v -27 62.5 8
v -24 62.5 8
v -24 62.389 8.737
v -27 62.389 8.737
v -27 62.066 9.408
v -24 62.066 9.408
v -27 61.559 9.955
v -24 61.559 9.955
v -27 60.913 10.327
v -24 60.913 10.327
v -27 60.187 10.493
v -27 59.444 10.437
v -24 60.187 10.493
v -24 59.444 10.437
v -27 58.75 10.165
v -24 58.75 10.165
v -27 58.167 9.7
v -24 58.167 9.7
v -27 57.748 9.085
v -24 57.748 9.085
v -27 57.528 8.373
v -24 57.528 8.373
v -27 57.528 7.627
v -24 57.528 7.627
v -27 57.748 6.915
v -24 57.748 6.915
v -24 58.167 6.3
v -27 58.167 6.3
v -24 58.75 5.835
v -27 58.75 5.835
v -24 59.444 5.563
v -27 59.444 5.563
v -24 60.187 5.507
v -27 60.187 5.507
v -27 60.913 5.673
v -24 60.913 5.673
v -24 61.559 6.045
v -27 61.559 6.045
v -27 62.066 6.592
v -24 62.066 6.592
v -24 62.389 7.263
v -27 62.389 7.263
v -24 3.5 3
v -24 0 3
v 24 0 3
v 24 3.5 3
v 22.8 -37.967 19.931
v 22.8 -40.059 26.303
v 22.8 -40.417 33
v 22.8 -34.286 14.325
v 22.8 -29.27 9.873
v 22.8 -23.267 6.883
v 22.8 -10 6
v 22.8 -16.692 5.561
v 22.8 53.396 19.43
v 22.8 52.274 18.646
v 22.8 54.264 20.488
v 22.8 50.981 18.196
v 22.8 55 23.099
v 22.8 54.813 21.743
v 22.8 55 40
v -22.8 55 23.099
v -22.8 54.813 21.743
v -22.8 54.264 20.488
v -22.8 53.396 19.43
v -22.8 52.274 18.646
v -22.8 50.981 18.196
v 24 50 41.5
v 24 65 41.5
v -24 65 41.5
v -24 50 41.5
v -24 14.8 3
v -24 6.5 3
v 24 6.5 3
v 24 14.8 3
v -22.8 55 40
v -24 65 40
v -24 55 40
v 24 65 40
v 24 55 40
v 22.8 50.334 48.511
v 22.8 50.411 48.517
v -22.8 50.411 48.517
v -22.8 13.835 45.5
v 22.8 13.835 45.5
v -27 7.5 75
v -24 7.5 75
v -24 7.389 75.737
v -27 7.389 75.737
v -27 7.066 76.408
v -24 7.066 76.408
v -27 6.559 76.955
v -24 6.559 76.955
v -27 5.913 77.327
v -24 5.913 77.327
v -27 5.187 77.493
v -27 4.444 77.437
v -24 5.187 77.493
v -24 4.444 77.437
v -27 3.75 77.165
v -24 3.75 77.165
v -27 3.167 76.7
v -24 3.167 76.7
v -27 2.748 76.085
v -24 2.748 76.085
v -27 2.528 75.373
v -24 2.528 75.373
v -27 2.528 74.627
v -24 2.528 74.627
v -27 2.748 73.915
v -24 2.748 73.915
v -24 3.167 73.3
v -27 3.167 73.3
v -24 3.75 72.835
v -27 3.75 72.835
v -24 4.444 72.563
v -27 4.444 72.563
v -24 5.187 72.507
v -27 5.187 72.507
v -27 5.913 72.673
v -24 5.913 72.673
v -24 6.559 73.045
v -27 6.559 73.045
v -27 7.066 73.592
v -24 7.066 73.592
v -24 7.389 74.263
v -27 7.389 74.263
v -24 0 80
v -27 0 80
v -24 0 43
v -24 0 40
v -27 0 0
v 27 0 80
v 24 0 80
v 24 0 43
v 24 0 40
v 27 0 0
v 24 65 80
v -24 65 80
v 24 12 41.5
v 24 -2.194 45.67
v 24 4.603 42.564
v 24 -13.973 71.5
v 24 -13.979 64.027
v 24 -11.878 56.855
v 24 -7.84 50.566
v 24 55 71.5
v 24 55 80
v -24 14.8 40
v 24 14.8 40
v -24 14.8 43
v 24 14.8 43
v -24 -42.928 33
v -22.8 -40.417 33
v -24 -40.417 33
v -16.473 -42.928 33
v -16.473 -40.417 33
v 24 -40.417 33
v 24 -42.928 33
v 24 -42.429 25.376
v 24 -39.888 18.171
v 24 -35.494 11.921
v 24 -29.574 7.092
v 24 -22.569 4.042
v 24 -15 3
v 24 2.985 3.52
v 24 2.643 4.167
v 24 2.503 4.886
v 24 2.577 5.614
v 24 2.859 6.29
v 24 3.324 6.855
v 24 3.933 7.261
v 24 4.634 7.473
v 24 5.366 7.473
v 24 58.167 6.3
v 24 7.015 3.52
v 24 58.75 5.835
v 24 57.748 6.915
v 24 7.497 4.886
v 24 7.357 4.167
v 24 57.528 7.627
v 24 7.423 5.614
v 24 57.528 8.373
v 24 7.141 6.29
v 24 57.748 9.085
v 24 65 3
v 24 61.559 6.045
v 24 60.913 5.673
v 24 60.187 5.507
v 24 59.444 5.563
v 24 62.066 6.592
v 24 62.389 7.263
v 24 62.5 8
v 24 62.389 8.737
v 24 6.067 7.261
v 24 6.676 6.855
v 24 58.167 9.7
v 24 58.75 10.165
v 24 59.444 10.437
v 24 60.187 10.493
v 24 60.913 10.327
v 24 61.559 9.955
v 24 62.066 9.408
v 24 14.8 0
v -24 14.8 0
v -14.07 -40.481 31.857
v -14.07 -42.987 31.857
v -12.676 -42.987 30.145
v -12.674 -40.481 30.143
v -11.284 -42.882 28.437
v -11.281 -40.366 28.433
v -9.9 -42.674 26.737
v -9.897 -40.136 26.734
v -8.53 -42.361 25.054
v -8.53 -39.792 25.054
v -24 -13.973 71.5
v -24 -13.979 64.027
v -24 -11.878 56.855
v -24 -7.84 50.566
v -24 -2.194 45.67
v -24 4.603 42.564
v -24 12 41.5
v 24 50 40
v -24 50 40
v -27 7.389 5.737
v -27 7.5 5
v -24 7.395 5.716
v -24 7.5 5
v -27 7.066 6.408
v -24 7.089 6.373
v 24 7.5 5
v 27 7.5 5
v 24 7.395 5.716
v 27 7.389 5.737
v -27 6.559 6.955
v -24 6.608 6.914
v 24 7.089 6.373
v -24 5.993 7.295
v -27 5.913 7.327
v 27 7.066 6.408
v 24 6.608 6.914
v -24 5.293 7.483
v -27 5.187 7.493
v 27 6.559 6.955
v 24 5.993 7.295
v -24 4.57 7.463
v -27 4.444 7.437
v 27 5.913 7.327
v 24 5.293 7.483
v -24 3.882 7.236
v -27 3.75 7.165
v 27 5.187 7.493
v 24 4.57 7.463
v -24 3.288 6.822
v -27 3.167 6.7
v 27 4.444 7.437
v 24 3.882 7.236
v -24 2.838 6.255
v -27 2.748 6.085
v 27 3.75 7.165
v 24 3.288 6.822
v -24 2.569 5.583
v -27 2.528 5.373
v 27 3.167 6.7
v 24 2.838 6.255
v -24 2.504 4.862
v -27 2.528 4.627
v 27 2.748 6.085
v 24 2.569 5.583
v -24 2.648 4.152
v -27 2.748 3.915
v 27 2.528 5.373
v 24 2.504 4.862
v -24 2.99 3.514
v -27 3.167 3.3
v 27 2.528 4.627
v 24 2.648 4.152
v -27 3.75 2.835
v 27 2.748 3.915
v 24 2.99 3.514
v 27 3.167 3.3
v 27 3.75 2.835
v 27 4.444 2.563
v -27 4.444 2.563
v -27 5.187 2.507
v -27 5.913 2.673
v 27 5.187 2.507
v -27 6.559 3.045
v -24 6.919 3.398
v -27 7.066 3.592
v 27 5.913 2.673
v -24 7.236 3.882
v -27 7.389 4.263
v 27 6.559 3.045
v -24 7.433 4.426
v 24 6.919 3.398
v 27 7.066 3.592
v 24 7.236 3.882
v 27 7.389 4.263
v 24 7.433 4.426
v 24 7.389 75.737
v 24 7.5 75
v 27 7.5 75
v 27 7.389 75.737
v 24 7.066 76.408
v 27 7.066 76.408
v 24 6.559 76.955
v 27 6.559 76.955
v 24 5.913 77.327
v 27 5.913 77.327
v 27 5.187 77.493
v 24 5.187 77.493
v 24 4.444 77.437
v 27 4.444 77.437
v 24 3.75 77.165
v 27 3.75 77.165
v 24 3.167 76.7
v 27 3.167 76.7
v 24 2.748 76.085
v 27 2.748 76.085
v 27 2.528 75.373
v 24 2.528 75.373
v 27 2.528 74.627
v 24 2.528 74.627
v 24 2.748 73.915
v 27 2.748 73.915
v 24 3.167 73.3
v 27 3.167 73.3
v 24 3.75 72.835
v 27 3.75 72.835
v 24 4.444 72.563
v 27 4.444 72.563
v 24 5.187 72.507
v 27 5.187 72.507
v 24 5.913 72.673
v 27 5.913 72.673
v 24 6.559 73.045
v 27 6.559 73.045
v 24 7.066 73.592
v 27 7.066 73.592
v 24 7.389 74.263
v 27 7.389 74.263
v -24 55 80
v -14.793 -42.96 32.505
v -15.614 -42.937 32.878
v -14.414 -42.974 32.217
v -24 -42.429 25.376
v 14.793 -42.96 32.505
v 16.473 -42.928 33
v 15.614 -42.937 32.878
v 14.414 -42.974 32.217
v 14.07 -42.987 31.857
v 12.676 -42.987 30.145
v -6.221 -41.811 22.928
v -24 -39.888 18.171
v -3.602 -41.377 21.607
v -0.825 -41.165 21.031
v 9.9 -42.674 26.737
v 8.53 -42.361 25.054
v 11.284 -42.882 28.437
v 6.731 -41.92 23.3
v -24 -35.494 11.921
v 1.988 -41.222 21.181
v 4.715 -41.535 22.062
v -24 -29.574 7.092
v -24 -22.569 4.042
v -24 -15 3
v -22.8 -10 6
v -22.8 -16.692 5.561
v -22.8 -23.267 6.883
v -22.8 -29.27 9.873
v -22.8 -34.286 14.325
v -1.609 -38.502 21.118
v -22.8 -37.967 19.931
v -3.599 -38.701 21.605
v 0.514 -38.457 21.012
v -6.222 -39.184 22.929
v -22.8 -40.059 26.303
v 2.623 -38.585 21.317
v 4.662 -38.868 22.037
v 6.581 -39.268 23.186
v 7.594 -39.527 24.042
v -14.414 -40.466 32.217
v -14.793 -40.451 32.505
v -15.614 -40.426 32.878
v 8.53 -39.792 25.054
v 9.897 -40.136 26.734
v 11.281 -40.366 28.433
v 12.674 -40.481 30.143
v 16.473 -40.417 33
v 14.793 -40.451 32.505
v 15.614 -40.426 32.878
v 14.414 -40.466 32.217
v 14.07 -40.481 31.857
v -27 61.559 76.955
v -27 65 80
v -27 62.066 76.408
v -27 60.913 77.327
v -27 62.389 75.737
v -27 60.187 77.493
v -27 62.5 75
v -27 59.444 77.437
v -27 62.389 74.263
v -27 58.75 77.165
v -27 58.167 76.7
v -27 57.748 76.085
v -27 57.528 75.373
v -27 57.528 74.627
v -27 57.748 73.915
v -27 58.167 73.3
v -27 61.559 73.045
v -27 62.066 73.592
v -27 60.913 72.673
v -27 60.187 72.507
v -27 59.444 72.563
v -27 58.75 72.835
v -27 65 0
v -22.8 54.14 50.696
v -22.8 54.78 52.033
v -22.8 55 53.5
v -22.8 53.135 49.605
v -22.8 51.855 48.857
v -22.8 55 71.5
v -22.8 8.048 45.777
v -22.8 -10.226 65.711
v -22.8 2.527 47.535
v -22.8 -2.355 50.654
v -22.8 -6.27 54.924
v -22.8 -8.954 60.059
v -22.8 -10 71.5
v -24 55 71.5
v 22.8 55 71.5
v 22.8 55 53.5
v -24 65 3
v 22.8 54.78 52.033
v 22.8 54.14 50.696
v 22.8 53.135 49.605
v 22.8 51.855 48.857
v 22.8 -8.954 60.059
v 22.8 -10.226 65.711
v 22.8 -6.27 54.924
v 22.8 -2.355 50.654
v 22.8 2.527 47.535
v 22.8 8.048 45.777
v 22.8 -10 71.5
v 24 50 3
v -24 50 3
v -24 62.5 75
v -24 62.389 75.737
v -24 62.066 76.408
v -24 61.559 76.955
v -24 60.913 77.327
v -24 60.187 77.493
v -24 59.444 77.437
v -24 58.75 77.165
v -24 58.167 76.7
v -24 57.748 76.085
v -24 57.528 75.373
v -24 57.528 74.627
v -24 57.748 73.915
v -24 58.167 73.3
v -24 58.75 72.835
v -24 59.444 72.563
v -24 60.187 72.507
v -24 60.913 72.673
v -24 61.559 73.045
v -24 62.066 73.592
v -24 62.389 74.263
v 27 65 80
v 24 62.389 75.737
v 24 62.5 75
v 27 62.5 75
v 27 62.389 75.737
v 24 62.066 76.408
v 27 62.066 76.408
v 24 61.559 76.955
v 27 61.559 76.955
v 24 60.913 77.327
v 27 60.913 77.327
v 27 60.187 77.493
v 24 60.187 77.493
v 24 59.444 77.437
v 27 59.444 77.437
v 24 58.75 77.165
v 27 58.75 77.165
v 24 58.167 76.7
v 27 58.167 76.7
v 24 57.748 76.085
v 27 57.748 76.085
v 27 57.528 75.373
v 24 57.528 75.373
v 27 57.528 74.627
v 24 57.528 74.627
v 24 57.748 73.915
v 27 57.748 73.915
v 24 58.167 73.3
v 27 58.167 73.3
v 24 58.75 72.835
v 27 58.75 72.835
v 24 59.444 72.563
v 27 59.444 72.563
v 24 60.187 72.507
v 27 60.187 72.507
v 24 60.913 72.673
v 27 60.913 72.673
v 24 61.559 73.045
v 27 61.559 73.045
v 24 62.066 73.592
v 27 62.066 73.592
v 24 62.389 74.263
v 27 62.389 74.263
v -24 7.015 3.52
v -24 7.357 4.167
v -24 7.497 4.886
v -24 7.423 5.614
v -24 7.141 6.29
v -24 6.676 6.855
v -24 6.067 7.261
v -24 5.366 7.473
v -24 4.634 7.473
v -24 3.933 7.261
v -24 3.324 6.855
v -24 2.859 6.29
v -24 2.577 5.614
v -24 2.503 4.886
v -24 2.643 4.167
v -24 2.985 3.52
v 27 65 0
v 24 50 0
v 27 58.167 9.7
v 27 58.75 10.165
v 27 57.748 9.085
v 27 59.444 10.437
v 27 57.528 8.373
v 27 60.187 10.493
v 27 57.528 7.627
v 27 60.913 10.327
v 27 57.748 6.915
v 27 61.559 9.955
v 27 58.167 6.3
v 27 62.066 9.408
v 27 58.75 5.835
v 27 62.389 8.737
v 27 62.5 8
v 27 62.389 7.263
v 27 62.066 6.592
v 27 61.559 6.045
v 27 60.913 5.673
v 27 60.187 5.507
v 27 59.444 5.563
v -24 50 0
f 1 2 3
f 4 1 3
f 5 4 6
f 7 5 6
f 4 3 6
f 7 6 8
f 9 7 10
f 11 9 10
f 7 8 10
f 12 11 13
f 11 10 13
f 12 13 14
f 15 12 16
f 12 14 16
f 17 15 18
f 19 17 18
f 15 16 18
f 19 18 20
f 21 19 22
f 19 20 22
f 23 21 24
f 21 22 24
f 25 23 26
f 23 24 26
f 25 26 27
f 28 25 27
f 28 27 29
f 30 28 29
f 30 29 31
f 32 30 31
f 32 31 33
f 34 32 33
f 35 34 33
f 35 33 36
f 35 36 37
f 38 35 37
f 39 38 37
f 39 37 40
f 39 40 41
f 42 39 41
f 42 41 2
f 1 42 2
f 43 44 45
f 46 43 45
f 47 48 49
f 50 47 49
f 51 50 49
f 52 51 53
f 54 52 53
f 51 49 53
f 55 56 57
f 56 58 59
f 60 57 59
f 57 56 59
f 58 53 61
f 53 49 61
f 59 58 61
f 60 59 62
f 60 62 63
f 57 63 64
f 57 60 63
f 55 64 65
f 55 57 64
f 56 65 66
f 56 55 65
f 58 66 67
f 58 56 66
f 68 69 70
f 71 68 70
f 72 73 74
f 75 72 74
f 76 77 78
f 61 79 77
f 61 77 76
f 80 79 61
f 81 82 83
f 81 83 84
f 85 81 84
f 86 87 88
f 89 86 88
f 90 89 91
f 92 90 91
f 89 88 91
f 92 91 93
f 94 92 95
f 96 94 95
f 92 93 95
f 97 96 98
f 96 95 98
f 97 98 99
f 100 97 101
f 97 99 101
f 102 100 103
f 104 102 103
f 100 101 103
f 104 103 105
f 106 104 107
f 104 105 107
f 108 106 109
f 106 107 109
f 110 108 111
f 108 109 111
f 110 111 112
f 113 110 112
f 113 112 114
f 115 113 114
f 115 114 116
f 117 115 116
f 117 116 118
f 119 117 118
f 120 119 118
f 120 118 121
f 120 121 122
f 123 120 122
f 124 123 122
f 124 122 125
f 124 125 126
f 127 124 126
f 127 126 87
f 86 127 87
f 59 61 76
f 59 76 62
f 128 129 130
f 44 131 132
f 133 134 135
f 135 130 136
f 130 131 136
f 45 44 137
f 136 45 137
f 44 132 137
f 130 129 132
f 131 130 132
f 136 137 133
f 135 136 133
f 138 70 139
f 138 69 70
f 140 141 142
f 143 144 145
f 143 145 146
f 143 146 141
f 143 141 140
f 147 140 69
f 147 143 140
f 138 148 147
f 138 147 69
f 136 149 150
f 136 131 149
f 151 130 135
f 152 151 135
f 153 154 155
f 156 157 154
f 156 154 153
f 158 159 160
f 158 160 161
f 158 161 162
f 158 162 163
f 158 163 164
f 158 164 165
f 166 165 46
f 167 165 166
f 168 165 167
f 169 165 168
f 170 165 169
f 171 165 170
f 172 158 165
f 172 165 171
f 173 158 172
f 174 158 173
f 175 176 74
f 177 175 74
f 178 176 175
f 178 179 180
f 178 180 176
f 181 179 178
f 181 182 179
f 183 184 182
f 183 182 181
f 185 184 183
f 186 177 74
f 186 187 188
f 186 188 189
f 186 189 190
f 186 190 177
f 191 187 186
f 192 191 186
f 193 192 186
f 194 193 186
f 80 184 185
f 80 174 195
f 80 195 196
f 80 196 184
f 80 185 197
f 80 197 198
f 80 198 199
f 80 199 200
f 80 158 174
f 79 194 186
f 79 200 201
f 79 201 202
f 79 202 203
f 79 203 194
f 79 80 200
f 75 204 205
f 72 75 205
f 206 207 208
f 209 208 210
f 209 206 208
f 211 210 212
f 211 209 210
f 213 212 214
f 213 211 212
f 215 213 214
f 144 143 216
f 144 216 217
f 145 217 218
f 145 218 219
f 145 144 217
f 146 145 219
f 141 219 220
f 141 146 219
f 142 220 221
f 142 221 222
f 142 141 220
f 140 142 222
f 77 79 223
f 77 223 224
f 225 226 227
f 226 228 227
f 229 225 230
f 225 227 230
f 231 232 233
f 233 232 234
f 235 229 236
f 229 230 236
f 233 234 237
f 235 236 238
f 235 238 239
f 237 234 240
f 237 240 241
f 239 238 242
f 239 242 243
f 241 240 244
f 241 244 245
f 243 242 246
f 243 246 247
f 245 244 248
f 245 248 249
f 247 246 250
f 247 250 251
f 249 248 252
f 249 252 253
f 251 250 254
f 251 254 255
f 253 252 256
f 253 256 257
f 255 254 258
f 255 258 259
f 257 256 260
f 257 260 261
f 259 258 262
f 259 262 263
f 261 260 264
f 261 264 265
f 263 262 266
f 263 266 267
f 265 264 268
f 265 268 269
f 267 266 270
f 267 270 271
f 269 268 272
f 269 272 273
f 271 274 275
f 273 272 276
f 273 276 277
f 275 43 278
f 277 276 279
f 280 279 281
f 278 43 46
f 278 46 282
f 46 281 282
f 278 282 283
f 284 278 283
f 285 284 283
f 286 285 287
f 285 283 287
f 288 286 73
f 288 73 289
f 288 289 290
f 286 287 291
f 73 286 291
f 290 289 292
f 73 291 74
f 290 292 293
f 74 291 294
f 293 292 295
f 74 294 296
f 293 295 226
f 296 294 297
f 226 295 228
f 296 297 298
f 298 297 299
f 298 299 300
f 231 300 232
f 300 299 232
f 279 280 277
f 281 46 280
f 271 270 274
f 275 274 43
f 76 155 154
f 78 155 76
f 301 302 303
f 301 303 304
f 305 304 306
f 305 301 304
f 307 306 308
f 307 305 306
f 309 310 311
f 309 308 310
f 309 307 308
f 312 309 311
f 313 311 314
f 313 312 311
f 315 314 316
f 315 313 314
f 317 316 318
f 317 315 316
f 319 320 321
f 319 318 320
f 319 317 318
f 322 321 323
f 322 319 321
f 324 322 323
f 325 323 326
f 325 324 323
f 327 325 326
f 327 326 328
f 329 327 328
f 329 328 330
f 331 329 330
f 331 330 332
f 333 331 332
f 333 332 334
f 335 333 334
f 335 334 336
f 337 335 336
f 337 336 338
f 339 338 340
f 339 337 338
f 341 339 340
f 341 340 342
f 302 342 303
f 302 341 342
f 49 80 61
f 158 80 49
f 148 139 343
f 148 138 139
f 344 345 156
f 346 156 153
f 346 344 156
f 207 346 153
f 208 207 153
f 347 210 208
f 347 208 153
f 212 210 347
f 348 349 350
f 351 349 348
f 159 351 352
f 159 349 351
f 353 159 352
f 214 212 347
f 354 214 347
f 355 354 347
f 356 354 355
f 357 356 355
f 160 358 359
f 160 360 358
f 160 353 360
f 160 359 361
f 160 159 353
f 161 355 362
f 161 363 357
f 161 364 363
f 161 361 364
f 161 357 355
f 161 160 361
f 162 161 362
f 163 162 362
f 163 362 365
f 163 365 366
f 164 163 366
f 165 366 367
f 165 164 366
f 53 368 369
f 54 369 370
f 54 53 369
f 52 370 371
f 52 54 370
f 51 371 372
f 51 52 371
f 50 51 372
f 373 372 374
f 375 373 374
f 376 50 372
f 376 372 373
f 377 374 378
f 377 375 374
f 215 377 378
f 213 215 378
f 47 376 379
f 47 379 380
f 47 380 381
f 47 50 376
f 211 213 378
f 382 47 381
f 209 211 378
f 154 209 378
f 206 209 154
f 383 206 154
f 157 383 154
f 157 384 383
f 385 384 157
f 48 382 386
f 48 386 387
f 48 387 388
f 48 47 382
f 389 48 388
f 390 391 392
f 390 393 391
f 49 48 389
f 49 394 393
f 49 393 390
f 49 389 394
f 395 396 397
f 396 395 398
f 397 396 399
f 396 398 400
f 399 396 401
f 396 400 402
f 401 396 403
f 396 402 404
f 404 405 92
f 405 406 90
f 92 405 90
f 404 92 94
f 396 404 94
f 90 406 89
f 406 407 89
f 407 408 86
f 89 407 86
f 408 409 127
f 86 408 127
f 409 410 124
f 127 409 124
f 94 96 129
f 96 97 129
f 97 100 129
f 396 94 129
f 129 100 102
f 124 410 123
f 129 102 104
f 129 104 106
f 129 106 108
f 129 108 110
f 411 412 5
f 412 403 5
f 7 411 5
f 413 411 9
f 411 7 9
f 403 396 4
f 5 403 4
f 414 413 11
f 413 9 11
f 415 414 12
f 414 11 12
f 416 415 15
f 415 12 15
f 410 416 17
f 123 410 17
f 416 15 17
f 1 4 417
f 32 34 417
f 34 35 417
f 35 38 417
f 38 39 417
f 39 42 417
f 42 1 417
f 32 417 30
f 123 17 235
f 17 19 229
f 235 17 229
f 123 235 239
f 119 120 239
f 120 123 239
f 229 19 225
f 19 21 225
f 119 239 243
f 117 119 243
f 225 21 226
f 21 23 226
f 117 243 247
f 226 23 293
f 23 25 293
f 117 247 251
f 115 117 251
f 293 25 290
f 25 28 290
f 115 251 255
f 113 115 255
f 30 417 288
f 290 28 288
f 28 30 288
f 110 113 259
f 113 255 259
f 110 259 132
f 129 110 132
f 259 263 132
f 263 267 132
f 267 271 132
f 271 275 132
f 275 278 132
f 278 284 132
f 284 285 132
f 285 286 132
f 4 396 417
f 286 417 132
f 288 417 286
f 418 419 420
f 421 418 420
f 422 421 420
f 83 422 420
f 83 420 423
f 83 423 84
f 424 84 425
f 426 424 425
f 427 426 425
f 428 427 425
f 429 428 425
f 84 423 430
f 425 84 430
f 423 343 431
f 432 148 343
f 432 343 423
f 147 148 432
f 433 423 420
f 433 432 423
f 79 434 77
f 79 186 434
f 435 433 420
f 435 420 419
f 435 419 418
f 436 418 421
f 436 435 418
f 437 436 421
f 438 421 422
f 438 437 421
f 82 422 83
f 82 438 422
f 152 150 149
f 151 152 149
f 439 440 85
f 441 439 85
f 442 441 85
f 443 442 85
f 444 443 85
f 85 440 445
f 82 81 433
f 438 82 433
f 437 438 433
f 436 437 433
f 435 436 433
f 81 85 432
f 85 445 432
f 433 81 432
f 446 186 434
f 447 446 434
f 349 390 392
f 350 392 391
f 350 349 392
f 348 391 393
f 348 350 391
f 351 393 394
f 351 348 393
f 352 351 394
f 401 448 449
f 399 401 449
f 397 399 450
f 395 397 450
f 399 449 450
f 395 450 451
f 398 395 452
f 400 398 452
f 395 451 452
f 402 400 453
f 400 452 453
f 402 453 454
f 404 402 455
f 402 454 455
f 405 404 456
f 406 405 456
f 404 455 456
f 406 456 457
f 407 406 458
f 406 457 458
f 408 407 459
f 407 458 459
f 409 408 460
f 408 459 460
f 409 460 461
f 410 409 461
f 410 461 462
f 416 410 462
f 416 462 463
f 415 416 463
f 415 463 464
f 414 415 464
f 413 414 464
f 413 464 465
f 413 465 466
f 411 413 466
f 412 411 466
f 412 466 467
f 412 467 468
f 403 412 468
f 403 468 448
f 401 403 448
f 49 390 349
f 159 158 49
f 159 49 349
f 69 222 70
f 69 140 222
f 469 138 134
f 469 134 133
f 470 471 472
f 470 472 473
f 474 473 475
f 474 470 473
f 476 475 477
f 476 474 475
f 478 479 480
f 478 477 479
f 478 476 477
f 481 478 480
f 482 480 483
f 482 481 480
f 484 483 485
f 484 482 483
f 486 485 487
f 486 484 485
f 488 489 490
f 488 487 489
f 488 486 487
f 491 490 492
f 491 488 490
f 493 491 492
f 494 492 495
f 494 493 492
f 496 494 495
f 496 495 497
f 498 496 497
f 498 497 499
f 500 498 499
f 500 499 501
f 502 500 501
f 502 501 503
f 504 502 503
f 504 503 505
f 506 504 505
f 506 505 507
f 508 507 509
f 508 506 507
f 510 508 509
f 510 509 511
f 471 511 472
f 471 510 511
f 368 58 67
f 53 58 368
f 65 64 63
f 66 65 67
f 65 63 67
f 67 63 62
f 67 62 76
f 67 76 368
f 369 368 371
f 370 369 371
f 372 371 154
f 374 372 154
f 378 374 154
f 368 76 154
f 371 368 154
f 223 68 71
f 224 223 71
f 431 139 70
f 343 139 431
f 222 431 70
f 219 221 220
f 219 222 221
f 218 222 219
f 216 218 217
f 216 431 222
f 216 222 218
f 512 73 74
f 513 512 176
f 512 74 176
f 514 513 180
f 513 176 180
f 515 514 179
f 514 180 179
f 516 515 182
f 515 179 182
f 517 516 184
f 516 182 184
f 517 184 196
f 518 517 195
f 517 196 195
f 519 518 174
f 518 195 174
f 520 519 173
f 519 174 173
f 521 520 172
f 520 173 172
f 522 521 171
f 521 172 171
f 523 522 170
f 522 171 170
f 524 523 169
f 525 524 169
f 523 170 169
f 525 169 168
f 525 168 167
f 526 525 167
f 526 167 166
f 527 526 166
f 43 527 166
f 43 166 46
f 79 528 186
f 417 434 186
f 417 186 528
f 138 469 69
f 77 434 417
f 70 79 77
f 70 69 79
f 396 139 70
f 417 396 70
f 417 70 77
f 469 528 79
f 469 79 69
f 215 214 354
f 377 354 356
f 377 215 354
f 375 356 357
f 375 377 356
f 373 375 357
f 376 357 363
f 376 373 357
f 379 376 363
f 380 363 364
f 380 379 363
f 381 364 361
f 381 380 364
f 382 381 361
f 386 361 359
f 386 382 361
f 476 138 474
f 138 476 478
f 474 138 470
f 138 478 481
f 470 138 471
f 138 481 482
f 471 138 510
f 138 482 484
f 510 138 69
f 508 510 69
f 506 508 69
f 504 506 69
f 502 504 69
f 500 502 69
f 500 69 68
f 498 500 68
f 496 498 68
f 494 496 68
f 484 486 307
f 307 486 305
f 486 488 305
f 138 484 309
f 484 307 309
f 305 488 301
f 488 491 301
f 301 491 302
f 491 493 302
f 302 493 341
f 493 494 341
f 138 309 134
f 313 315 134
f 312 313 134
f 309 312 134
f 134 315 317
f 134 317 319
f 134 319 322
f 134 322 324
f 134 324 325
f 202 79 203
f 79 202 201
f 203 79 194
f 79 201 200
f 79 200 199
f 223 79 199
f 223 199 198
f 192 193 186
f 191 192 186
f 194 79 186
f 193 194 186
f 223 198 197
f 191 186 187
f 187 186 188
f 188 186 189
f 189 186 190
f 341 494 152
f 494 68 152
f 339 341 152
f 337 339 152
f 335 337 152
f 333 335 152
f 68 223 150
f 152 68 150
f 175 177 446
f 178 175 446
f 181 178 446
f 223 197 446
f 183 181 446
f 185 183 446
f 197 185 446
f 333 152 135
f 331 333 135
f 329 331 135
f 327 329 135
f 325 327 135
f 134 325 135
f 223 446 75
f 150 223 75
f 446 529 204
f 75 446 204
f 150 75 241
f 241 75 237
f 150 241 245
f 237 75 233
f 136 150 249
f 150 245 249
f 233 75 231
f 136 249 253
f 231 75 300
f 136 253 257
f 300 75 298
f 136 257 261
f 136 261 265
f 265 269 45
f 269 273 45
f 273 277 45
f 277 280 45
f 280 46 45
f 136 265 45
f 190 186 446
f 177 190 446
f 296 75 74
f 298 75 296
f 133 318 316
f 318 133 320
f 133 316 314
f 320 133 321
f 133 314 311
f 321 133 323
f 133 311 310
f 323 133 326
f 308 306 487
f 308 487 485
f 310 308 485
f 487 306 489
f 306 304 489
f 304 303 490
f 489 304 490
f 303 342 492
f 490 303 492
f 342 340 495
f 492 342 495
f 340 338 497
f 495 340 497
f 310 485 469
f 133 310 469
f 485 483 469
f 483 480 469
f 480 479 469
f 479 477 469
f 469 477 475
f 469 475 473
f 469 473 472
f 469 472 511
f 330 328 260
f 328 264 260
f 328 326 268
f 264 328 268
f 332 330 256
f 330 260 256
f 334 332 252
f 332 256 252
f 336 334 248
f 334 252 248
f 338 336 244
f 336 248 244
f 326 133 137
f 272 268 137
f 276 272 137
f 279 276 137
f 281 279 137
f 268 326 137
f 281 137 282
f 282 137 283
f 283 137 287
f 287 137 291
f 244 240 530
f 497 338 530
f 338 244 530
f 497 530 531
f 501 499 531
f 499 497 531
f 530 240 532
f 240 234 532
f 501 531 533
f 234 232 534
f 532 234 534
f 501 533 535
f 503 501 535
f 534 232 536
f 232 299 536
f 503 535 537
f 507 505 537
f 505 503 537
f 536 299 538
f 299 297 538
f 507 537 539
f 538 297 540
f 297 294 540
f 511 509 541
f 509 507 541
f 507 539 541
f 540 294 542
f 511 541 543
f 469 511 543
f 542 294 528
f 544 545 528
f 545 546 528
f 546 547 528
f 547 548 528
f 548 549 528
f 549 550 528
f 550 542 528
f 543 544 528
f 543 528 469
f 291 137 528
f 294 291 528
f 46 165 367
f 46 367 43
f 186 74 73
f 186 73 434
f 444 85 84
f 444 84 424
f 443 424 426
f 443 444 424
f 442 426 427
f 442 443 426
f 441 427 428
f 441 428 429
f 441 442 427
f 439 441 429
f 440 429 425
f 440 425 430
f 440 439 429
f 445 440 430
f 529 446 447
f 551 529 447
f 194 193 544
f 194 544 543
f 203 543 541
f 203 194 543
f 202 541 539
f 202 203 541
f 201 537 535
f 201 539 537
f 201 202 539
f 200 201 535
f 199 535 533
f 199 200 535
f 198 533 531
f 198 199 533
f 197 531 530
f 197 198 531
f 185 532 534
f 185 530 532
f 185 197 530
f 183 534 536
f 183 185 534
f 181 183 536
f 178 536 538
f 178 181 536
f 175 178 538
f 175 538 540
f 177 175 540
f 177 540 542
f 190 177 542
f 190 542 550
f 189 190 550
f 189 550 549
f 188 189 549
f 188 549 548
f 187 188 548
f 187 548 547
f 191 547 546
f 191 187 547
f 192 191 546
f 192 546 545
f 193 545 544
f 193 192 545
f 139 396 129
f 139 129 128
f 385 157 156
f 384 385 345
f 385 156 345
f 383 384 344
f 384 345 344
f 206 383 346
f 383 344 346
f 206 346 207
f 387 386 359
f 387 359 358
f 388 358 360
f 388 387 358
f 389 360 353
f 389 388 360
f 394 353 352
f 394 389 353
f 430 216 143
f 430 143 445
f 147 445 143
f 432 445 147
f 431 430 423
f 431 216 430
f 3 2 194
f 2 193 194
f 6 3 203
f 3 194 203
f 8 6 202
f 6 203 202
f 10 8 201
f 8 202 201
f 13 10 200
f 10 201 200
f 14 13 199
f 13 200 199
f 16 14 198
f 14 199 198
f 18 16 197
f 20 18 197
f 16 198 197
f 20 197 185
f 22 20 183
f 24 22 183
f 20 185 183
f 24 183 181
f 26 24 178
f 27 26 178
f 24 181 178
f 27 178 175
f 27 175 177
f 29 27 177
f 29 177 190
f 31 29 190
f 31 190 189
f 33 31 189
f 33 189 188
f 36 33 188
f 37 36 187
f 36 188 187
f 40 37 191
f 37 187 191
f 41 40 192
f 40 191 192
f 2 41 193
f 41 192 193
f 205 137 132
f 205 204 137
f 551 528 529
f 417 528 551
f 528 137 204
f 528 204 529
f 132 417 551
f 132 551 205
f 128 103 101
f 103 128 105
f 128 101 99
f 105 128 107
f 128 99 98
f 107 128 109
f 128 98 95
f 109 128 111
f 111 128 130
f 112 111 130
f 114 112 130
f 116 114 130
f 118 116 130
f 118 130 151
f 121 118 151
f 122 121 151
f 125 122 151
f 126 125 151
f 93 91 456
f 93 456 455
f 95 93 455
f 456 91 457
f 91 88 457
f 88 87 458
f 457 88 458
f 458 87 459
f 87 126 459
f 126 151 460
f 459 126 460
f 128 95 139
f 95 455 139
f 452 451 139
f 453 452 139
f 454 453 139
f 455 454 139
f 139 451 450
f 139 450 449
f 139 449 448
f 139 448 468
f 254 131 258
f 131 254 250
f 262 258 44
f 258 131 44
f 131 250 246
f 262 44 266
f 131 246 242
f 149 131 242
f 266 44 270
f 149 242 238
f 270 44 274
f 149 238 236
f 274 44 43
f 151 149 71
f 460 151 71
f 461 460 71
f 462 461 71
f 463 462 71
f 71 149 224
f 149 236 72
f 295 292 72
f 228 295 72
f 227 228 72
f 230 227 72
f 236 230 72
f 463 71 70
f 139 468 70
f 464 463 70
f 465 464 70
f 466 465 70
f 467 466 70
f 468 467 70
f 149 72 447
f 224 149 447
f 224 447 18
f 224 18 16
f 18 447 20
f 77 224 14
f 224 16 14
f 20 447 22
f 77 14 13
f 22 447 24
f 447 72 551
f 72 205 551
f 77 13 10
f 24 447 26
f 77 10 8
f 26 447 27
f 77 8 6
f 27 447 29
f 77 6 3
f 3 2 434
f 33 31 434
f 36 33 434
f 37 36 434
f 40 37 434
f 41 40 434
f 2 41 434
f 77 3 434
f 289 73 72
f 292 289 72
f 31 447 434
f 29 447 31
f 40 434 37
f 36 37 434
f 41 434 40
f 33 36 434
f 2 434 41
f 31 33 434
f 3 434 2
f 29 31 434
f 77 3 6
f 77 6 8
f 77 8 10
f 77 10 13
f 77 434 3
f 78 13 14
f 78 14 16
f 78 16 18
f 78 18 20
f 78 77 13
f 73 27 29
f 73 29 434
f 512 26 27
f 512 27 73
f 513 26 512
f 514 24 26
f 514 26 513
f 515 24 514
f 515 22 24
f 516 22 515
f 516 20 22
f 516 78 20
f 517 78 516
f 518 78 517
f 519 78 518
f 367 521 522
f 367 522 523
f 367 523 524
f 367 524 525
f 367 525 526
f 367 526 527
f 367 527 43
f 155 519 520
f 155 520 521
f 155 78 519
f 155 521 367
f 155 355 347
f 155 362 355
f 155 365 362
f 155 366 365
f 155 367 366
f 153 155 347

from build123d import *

# Parameters (mm, degrees)
F1_DEPTH  = 80
F2_W      = 48
F2_H      = 37
F3_DEPTH  = 65.001
F4_DEPTH  = 11.8
F5_W      = 48
F5_H      = 3
F6_DEPTH  = 15
F7_DEPTH  = 11.8
F8_W      = 48
F8_H      = 1.5
F9_DEPTH  = 15
F11_DEPTH = 24
F12_R     = 2.5
F13_DEPTH = 30
F15_DEPTH = 43.001
F16_R     = 3.1
F18_DEPTH = 1.2
F20_DEPTH = 1.2
F22_DEPTH = 24
F24_DEPTH = 1.2
F26_DEPTH = 1.2


# Not quite as in the source:
# - a feature names something its author has since deleted; it is built from what else it names


with BuildPart() as f1:
    # F0 (on Top) → F1 (new body)
    with BuildSketch(Plane.XY):
        Polygon((-24, 65), (-27, 65), (-27, 0), (27, 0), (27, 65), (24, 65), (24, 3), (-24, 3), align=None)
    extrude(amount=F1_DEPTH)

    # F2 (on face) → F3 (cut, through all)
    with BuildSketch(Plane.XZ):
        with Locations((0, 21.5)):
            Rectangle(F2_W, F2_H)
        with Locations((0, 61.5)):
            Rectangle(F2_W, F2_H)
    extrude(amount=-F3_DEPTH, mode=Mode.SUBTRACT)

    # F4 (add): a face of the model
    f4_faces = [f1.faces().sort_by_distance(p)[0] for p in [
        (0, 3, 1.5),
    ]]
    extrude(f4_faces, amount=F4_DEPTH)

    # F5 (on face) → F6 (join)
    with BuildSketch(Plane(origin=(0, 65, 0), x_dir=(-1, 0, 0), z_dir=(0, 1, 0))):
        with Locations((0, 1.5)):
            Rectangle(F5_W, F5_H)
    extrude(amount=-F6_DEPTH)

    # F7 (add, through all): a face of the model
    f7_faces = [f1.faces().sort_by_distance(p)[0] for p in [
        (0, 3, 41.5),
    ]]
    extrude(f7_faces, amount=F7_DEPTH)

    # F8 (on face) → F9 (join)
    with BuildSketch(Plane(origin=(0, 65, 0), x_dir=(-1, 0, 0), z_dir=(0, 1, 0))):
        with Locations((0, 40.75)):
            Rectangle(F8_W, F8_H)
    extrude(amount=-F9_DEPTH)


with BuildPart() as f11:
    # F10 (on Right) → F11 (new body, symmetric)
    with BuildSketch(Plane.YZ):
        with BuildLine():
            Line((65, 3), (65, 21))
            Line((65, 21), (65, 40))
            Line((65, 40), (55, 40))
            Line((55, 40), (55, 23.0990195136))
            ThreePointArc((55, 23.0990195136), (53.8667107067, 19.9290749856), (50.9805806757, 18.1961161351))
            Line((50.9805806757, 18.1961161351), (-10, 6))
            ThreePointArc((-10, 6), (-31.9250900991, 11.9332403084), (-40.4165300543, 33))
            Line((-40.4165300543, 33), (-42.9284800875, 33))
            ThreePointArc((-42.9284800875, 33), (-35.4939015319, 11.9212159717), (-15, 3))
            Line((-15, 3), (55, 3))
            Line((55, 3), (65, 3))
        make_face()
    extrude(amount=F11_DEPTH, both=True)


with BuildPart() as f13_tool:
    # F12 (on Right) → F13 (new body, symmetric)
    with BuildSketch(Plane.YZ):
        with Locations((60, 75)):
            Circle(F12_R)
        with Locations((60, 8)):
            Circle(F12_R)
        with Locations((5, 75)):
            Circle(F12_R)
        with Locations((5, 5)):
            Circle(F12_R)
    extrude(amount=F13_DEPTH, both=True)


with BuildPart() as f1_1:
    add(f1.part)

    # F13: cut by f13_tool
    add(f13_tool.part, mode=Mode.SUBTRACT)


with BuildPart() as f11_1:
    add(f11.part)

    # F13: cut by f13_tool
    add(f13_tool.part, mode=Mode.SUBTRACT)

    # F14 (on Front) → F15 (cut, through all)
    with BuildSketch(Plane.XZ):
        with BuildLine():
            Line((-15, 33), (-8.5297188426, 25.0542173611))
            ThreePointArc((-8.5297188426, 25.0542173611), (0, 21), (8.5297188426, 25.0542173611))
            Line((8.5297188426, 25.0542173611), (15, 33))
            Line((15, 33), (-15, 33))
        make_face()
    extrude(amount=F15_DEPTH, mode=Mode.SUBTRACT)

    # F16
    f16_edges = [f11_1.edges().sort_by_distance(p)[0] for p in [
        (-15, -41.672505, 33),
        (15, -41.672505, 33),
    ]]
    fillet(f16_edges, radius=F16_R)

    # F17 (on face) → F18 (join)
    with BuildSketch(Plane.YZ.offset(24)):
        with BuildLine():
            ThreePointArc((-40.4165300543, 33), (-31.9250900991, 11.9332403084), (-10, 6))
            Line((-10, 6), (50.9805806757, 18.1961161351))
            ThreePointArc((50.9805806757, 18.1961161351), (53.8667107067, 19.9290749856), (55, 23.0990195136))
            Line((55, 23.0990195136), (55, 40))
            Line((55, 40), (-40.4165300543, 33))
        make_face()
    extrude(amount=-F18_DEPTH)

    # F19 (on face) → F20 (join)
    with BuildSketch(Plane(origin=(-24, 0, 0), x_dir=(0, -1, 0), z_dir=(-1, 0, 0))):
        with BuildLine():
            ThreePointArc((-55, 23.0990195136), (-53.8667107067, 19.9290749856), (-50.9805806757, 18.1961161351))
            Line((-50.9805806757, 18.1961161351), (10, 6))
            ThreePointArc((10, 6), (31.9250900991, 11.9332403084), (40.4165300543, 33))
            Line((40.4165300543, 33), (-55, 40))
            Line((-55, 40), (-55, 23.0990195136))
        make_face()
    extrude(amount=-F20_DEPTH)


with BuildPart() as f22:
    # F21 (on Right) → F22 (new body, symmetric)
    with BuildSketch(Plane.YZ):
        with BuildLine():
            Line((65, 80), (55, 80))
            Line((55, 80), (55, 53.5))
            ThreePointArc((55, 53.5), (53.677981268, 50.1128989103), (50.4110184832, 48.5169222556))
            Line((50.4110184832, 48.5169222556), (13.8346630084, 45.5))
            ThreePointArc((13.8346630084, 45.5), (-4.4517538274, 52.6613460558), (-10, 71.5))
            Line((-10, 71.5), (-13.9726337853, 71.5))
            ThreePointArc((-13.9726337853, 71.5), (-7.8404744509, 50.5659825278), (12, 41.5))
            Line((12, 41.5), (65, 41.5))
            Line((65, 41.5), (65, 80))
        make_face()
    extrude(amount=F22_DEPTH, both=True)

    # F23 (on face) → F24 (join)
    with BuildSketch(Plane.YZ.offset(24)):
        with BuildLine():
            Line((55, 71.5), (-10, 71.5))
            ThreePointArc((-10, 71.5), (-4.4517538274, 52.6613460558), (13.8346630084, 45.5))
            Line((13.8346630084, 45.5), (50.3340224507, 48.510571403))
            Line((50.3340224507, 48.510571403), (50.4110184832, 48.5169222556))
            ThreePointArc((50.4110184832, 48.5169222556), (53.677981268, 50.1128989103), (55, 53.5))
            Line((55, 53.5), (55, 71.5))
        make_face()
    extrude(amount=-F24_DEPTH)

    # F25 (on face) → F26 (join)
    with BuildSketch(Plane(origin=(-24, 0, 0), x_dir=(0, -1, 0), z_dir=(-1, 0, 0))):
        with BuildLine():
            ThreePointArc((-13.8346630084, 45.5), (4.4517538274, 52.6613460558), (10, 71.5))
            Line((10, 71.5), (-55, 71.5))
            Line((-55, 71.5), (-55, 53.5))
            ThreePointArc((-55, 53.5), (-53.677981268, 50.1128989103), (-50.4110184832, 48.5169222556))
            Line((-50.4110184832, 48.5169222556), (-13.8346630084, 45.5))
        make_face()
    extrude(amount=-F26_DEPTH)


solid = Compound([f1_1.part, f11_1.part, f22.part])
